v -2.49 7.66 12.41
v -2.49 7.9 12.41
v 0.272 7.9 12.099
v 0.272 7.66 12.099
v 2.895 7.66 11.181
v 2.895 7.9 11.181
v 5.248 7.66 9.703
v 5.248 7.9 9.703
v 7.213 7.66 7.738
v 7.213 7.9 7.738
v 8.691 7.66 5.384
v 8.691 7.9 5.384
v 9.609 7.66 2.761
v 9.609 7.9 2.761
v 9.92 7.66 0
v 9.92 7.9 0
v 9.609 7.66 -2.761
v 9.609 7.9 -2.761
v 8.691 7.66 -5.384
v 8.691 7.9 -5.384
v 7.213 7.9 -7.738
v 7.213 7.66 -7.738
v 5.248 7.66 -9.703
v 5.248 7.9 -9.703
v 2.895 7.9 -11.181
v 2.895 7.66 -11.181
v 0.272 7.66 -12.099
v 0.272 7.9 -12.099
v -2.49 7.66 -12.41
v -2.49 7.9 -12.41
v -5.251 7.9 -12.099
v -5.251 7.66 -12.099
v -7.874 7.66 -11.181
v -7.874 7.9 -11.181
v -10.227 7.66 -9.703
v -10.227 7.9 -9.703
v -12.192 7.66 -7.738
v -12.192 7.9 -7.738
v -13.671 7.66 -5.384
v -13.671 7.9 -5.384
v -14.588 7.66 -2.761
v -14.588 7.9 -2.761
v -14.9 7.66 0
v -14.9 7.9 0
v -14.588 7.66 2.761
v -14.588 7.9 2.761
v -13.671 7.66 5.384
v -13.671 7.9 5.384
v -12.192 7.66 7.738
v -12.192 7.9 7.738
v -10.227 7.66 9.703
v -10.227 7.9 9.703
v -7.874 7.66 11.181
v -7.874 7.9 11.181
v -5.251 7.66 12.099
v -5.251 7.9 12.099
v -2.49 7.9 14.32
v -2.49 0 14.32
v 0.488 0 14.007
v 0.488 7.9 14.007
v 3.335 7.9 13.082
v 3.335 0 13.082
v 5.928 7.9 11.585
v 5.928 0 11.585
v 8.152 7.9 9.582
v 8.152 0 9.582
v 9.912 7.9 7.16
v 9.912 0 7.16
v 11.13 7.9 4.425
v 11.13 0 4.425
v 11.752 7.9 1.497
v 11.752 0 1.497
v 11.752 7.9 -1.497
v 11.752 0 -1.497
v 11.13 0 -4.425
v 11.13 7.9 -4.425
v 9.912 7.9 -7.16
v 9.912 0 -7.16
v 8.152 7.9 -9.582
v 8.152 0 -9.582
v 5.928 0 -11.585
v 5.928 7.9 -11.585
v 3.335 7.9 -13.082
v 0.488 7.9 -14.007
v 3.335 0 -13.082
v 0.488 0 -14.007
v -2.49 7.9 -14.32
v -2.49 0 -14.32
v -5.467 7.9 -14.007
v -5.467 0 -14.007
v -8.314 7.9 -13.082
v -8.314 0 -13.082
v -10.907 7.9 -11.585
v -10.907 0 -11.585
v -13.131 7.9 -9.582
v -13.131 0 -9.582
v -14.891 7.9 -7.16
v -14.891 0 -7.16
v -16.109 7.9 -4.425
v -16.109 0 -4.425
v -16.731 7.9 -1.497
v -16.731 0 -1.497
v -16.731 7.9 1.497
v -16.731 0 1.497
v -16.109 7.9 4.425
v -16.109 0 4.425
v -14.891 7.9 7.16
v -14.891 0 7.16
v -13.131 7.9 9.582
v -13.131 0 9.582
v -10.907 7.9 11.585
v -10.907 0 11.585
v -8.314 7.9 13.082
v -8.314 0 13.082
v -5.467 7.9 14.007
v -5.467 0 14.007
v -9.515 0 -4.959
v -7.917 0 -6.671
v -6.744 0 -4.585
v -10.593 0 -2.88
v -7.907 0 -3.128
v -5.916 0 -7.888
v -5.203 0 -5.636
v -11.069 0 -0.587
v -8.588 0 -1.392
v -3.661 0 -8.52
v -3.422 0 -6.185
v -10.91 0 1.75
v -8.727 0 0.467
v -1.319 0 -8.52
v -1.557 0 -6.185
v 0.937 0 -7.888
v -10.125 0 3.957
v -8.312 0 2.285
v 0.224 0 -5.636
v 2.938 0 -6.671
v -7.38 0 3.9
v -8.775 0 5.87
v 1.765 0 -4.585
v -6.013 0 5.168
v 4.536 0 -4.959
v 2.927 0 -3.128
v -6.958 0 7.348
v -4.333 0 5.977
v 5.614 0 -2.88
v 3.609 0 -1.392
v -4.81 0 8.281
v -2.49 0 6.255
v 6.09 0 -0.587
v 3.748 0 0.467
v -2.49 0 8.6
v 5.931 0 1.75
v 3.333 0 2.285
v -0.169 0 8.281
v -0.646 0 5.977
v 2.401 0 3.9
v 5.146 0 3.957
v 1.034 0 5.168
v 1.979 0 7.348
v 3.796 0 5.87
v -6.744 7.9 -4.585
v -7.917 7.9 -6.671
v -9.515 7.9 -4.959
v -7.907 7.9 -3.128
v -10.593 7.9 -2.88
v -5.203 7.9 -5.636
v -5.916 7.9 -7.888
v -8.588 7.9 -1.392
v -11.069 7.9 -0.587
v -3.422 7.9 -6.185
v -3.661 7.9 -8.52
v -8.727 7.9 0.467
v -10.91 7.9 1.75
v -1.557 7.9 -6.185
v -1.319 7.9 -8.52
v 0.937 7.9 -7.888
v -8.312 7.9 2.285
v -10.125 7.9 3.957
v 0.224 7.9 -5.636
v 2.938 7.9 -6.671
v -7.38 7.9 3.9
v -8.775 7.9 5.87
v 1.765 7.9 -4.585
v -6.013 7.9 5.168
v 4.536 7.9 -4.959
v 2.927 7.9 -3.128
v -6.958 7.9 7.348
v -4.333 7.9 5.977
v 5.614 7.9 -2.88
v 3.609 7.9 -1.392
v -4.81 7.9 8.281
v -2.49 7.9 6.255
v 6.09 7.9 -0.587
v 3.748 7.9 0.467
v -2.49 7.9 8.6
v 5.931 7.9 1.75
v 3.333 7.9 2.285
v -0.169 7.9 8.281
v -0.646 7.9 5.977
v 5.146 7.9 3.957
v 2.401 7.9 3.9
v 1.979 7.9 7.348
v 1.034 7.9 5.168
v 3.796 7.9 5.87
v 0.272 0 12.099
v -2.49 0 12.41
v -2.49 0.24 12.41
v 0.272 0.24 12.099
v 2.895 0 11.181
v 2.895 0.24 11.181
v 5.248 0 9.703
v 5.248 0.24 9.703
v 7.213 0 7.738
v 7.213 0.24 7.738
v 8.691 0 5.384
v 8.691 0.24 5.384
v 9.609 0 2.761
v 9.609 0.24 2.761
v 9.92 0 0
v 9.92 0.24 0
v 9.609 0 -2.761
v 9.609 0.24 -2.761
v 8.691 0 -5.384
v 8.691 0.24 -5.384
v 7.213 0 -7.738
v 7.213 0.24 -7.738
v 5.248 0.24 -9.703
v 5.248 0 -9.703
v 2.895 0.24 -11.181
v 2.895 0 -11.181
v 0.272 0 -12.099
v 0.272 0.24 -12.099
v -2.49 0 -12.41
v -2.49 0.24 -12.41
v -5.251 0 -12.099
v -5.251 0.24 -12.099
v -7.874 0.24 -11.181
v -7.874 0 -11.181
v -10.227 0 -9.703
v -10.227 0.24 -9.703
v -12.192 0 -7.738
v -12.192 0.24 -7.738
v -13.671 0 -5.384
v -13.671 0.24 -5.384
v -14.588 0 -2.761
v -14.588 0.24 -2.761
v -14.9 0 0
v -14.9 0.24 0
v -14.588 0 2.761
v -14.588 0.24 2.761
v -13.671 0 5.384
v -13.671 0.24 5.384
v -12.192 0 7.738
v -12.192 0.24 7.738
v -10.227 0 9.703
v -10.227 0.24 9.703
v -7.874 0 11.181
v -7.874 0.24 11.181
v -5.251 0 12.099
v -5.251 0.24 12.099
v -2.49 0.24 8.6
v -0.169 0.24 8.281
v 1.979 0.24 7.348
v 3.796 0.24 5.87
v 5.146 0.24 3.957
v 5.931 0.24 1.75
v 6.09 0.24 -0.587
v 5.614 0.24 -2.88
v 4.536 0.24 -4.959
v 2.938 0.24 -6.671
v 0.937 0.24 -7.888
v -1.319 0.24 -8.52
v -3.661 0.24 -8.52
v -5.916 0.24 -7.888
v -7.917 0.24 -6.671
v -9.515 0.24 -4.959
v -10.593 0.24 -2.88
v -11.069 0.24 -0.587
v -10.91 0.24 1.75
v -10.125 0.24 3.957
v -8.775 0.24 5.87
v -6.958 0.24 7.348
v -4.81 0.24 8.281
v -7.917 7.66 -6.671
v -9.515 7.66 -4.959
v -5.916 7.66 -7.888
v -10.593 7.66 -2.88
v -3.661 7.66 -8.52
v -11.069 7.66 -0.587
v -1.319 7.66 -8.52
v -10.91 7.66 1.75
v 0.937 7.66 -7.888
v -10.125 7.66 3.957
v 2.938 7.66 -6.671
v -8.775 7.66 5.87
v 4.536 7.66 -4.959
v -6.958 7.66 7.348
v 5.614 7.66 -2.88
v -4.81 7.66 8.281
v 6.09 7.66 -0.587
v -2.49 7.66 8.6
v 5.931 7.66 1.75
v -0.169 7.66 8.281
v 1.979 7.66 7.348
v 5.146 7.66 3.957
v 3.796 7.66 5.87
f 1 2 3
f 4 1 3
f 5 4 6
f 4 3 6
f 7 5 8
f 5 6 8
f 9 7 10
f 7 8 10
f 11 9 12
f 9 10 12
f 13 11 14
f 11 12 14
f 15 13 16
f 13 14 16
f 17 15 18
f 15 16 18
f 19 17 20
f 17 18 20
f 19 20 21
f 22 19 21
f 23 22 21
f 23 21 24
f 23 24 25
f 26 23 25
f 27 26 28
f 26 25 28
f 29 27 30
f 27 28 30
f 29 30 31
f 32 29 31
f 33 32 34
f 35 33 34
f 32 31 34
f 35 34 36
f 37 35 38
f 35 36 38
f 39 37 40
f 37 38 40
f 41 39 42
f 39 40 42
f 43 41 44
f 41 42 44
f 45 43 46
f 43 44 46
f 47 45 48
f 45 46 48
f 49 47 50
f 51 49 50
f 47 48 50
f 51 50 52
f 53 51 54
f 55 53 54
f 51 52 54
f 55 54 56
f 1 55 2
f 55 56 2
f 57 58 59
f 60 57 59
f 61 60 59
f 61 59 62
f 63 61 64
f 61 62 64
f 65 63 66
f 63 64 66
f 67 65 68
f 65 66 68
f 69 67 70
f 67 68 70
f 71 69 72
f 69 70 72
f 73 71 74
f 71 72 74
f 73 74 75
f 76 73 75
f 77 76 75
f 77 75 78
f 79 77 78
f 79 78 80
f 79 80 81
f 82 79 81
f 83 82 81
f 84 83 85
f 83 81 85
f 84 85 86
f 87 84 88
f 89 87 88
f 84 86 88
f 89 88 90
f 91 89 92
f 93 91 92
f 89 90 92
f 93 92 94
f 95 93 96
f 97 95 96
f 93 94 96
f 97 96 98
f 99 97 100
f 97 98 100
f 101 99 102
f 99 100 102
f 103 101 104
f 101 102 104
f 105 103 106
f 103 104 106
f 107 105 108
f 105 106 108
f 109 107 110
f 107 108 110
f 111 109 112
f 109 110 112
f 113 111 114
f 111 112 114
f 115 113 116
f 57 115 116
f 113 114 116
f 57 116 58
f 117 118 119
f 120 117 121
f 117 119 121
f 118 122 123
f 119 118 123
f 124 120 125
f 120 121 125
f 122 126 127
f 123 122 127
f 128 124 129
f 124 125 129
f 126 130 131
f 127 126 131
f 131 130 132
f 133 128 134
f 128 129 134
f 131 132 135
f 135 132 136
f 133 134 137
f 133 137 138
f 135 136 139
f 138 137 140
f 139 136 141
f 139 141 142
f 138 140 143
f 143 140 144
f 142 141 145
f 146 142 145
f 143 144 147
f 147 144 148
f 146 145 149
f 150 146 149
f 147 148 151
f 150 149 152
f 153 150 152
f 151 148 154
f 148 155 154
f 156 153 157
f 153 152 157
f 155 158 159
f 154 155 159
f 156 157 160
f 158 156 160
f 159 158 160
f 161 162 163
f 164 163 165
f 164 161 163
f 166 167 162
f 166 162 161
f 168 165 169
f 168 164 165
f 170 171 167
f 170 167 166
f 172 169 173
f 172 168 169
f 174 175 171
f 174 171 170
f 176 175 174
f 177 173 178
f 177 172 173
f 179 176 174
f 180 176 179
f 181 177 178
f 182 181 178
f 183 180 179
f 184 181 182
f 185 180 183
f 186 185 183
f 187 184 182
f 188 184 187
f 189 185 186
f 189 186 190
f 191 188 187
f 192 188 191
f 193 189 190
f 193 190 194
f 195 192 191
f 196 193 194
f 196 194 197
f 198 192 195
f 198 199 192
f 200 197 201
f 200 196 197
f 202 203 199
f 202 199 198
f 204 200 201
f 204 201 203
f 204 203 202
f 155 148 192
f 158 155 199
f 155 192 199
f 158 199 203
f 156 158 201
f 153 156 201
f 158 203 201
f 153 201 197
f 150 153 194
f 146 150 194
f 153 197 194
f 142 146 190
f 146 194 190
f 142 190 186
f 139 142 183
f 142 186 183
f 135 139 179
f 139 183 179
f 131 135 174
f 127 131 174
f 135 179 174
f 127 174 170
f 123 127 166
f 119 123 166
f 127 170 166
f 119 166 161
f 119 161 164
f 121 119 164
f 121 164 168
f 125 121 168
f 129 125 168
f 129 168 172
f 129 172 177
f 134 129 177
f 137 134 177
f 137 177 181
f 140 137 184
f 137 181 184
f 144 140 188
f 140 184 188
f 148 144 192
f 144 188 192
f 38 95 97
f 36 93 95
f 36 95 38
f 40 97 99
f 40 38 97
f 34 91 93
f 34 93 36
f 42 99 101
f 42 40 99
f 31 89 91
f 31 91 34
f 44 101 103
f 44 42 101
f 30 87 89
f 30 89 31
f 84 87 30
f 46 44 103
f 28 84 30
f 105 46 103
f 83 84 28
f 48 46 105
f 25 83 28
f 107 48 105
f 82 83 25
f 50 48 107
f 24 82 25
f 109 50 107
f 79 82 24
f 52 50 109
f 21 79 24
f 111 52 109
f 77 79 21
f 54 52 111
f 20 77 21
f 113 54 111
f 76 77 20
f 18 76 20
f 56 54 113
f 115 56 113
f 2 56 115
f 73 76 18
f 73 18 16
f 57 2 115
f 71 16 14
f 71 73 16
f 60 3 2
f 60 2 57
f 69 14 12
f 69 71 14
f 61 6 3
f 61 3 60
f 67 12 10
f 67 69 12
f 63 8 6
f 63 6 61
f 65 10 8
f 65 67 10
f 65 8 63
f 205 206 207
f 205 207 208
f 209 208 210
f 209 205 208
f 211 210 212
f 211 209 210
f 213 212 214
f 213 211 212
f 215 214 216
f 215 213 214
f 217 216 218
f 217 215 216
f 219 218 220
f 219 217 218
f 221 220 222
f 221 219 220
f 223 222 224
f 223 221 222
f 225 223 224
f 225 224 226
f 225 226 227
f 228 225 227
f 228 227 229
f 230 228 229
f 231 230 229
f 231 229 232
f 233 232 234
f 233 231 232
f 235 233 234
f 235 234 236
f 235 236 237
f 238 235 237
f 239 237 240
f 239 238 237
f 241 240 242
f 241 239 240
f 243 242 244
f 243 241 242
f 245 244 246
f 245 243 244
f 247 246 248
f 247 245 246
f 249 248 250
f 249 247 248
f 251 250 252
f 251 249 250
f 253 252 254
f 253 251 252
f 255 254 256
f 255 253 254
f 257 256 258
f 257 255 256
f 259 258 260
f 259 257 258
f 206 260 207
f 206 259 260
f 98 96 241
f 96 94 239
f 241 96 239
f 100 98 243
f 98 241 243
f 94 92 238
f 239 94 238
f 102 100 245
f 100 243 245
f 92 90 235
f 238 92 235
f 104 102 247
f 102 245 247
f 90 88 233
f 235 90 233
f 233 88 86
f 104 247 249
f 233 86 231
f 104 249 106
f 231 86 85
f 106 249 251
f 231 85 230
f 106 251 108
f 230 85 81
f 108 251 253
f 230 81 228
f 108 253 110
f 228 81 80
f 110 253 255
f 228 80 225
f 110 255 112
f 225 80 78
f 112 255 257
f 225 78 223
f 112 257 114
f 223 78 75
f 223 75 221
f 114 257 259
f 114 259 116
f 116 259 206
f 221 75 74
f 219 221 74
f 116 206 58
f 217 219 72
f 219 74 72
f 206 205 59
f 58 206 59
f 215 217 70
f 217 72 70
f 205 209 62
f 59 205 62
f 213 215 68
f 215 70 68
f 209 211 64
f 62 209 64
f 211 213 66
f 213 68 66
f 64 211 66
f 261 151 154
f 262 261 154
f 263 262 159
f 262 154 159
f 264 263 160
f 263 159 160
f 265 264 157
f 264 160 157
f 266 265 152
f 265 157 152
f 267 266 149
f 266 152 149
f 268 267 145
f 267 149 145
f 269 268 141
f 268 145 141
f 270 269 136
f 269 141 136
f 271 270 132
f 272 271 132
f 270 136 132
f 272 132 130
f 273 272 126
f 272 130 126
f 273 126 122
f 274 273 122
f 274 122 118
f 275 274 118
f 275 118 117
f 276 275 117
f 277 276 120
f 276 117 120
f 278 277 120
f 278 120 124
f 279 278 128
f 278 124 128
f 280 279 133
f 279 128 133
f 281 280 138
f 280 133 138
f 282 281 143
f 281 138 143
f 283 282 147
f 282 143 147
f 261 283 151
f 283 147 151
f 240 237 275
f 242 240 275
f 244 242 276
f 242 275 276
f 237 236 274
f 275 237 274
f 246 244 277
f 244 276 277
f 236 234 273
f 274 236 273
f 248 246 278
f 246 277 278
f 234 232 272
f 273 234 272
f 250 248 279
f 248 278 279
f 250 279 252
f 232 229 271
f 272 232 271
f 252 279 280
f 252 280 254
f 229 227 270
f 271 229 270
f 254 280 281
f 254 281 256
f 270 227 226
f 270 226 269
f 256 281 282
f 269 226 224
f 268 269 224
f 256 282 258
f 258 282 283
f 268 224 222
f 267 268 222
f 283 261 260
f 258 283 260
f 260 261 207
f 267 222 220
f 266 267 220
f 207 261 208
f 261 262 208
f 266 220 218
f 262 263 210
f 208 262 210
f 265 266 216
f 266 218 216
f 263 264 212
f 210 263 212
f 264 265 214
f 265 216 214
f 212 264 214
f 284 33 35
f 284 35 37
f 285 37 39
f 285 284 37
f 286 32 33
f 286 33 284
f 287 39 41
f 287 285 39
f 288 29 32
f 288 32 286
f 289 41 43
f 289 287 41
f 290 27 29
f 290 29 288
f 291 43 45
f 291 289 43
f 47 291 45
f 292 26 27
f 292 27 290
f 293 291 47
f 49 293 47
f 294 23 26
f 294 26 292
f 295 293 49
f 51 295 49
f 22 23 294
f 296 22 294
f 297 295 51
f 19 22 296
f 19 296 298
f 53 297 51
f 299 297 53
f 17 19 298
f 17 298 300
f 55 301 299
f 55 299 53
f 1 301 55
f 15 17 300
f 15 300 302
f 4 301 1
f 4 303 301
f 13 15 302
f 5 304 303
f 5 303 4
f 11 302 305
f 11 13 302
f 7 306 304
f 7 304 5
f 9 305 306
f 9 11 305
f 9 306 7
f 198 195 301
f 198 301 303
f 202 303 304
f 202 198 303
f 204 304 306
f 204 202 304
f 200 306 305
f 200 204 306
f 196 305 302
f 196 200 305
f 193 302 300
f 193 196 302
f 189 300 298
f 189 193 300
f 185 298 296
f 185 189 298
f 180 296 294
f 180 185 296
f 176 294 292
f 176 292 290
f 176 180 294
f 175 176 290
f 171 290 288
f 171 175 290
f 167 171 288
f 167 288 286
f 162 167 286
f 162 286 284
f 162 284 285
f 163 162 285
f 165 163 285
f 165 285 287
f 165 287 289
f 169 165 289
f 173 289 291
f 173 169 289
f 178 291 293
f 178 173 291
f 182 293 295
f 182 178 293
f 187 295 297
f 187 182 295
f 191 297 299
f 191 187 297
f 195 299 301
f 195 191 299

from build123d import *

# Parameters (mm, degrees)
ESBO_O1_R                = 14.32
RESSALTO_EXTRUS_O1_DEPTH = 7.9
ESBO_O2_R                = 6.255
CORTE_EXTRUS_O1_DEPTH    = 7.9
ESBO_O3_R                = 12.41
ESBO_O3_R_2              = 8.6
CORTE_EXTRUS_O2_DEPTH    = 0.24


with BuildPart() as part:
    # Esboço1 → Ressalto-extrusão1 (new body)
    with BuildSketch(Plane(origin=(0, 0, 0), x_dir=(1, 0, 0), z_dir=(0, 1, 0))):
        with Locations(Location((-2.489539578, 0, 0), (0, 0, 270))):
            Circle(ESBO_O1_R)
    extrude(amount=RESSALTO_EXTRUS_O1_DEPTH)

    # Esboço2 → Corte-extrusão1 (cut)
    with BuildSketch(Plane(origin=(0, 7.9, 0), x_dir=(1, 0, 0), z_dir=(0, 1, 0))):
        with Locations(Location((-2.489539578, 0, 0), (0, 0, 270))):
            Circle(ESBO_O2_R)
    extrude(amount=-CORTE_EXTRUS_O1_DEPTH, mode=Mode.SUBTRACT)

    # Esboço3 → Corte-extrusão2 (cut)
    with BuildSketch(Plane(origin=(0, 7.9, 0), x_dir=(1, 0, 0), z_dir=(0, 1, 0))):
        with Locations(Location((-2.489539578, 0, 0), (0, 0, 270))):
            Circle(ESBO_O3_R)
        with Locations(Location((-2.489539578, 0, 0), (0, 0, 270))):
            Circle(ESBO_O3_R_2, mode=Mode.SUBTRACT)
    corte_extrus_o2 = extrude(amount=-CORTE_EXTRUS_O2_DEPTH, mode=Mode.SUBTRACT)

    # Espelhar1: Corte-extrusão2 across plane
    add(corte_extrus_o2.mirror(Plane.ZX.offset(3.95)), mode=Mode.SUBTRACT)


solid = part.part
